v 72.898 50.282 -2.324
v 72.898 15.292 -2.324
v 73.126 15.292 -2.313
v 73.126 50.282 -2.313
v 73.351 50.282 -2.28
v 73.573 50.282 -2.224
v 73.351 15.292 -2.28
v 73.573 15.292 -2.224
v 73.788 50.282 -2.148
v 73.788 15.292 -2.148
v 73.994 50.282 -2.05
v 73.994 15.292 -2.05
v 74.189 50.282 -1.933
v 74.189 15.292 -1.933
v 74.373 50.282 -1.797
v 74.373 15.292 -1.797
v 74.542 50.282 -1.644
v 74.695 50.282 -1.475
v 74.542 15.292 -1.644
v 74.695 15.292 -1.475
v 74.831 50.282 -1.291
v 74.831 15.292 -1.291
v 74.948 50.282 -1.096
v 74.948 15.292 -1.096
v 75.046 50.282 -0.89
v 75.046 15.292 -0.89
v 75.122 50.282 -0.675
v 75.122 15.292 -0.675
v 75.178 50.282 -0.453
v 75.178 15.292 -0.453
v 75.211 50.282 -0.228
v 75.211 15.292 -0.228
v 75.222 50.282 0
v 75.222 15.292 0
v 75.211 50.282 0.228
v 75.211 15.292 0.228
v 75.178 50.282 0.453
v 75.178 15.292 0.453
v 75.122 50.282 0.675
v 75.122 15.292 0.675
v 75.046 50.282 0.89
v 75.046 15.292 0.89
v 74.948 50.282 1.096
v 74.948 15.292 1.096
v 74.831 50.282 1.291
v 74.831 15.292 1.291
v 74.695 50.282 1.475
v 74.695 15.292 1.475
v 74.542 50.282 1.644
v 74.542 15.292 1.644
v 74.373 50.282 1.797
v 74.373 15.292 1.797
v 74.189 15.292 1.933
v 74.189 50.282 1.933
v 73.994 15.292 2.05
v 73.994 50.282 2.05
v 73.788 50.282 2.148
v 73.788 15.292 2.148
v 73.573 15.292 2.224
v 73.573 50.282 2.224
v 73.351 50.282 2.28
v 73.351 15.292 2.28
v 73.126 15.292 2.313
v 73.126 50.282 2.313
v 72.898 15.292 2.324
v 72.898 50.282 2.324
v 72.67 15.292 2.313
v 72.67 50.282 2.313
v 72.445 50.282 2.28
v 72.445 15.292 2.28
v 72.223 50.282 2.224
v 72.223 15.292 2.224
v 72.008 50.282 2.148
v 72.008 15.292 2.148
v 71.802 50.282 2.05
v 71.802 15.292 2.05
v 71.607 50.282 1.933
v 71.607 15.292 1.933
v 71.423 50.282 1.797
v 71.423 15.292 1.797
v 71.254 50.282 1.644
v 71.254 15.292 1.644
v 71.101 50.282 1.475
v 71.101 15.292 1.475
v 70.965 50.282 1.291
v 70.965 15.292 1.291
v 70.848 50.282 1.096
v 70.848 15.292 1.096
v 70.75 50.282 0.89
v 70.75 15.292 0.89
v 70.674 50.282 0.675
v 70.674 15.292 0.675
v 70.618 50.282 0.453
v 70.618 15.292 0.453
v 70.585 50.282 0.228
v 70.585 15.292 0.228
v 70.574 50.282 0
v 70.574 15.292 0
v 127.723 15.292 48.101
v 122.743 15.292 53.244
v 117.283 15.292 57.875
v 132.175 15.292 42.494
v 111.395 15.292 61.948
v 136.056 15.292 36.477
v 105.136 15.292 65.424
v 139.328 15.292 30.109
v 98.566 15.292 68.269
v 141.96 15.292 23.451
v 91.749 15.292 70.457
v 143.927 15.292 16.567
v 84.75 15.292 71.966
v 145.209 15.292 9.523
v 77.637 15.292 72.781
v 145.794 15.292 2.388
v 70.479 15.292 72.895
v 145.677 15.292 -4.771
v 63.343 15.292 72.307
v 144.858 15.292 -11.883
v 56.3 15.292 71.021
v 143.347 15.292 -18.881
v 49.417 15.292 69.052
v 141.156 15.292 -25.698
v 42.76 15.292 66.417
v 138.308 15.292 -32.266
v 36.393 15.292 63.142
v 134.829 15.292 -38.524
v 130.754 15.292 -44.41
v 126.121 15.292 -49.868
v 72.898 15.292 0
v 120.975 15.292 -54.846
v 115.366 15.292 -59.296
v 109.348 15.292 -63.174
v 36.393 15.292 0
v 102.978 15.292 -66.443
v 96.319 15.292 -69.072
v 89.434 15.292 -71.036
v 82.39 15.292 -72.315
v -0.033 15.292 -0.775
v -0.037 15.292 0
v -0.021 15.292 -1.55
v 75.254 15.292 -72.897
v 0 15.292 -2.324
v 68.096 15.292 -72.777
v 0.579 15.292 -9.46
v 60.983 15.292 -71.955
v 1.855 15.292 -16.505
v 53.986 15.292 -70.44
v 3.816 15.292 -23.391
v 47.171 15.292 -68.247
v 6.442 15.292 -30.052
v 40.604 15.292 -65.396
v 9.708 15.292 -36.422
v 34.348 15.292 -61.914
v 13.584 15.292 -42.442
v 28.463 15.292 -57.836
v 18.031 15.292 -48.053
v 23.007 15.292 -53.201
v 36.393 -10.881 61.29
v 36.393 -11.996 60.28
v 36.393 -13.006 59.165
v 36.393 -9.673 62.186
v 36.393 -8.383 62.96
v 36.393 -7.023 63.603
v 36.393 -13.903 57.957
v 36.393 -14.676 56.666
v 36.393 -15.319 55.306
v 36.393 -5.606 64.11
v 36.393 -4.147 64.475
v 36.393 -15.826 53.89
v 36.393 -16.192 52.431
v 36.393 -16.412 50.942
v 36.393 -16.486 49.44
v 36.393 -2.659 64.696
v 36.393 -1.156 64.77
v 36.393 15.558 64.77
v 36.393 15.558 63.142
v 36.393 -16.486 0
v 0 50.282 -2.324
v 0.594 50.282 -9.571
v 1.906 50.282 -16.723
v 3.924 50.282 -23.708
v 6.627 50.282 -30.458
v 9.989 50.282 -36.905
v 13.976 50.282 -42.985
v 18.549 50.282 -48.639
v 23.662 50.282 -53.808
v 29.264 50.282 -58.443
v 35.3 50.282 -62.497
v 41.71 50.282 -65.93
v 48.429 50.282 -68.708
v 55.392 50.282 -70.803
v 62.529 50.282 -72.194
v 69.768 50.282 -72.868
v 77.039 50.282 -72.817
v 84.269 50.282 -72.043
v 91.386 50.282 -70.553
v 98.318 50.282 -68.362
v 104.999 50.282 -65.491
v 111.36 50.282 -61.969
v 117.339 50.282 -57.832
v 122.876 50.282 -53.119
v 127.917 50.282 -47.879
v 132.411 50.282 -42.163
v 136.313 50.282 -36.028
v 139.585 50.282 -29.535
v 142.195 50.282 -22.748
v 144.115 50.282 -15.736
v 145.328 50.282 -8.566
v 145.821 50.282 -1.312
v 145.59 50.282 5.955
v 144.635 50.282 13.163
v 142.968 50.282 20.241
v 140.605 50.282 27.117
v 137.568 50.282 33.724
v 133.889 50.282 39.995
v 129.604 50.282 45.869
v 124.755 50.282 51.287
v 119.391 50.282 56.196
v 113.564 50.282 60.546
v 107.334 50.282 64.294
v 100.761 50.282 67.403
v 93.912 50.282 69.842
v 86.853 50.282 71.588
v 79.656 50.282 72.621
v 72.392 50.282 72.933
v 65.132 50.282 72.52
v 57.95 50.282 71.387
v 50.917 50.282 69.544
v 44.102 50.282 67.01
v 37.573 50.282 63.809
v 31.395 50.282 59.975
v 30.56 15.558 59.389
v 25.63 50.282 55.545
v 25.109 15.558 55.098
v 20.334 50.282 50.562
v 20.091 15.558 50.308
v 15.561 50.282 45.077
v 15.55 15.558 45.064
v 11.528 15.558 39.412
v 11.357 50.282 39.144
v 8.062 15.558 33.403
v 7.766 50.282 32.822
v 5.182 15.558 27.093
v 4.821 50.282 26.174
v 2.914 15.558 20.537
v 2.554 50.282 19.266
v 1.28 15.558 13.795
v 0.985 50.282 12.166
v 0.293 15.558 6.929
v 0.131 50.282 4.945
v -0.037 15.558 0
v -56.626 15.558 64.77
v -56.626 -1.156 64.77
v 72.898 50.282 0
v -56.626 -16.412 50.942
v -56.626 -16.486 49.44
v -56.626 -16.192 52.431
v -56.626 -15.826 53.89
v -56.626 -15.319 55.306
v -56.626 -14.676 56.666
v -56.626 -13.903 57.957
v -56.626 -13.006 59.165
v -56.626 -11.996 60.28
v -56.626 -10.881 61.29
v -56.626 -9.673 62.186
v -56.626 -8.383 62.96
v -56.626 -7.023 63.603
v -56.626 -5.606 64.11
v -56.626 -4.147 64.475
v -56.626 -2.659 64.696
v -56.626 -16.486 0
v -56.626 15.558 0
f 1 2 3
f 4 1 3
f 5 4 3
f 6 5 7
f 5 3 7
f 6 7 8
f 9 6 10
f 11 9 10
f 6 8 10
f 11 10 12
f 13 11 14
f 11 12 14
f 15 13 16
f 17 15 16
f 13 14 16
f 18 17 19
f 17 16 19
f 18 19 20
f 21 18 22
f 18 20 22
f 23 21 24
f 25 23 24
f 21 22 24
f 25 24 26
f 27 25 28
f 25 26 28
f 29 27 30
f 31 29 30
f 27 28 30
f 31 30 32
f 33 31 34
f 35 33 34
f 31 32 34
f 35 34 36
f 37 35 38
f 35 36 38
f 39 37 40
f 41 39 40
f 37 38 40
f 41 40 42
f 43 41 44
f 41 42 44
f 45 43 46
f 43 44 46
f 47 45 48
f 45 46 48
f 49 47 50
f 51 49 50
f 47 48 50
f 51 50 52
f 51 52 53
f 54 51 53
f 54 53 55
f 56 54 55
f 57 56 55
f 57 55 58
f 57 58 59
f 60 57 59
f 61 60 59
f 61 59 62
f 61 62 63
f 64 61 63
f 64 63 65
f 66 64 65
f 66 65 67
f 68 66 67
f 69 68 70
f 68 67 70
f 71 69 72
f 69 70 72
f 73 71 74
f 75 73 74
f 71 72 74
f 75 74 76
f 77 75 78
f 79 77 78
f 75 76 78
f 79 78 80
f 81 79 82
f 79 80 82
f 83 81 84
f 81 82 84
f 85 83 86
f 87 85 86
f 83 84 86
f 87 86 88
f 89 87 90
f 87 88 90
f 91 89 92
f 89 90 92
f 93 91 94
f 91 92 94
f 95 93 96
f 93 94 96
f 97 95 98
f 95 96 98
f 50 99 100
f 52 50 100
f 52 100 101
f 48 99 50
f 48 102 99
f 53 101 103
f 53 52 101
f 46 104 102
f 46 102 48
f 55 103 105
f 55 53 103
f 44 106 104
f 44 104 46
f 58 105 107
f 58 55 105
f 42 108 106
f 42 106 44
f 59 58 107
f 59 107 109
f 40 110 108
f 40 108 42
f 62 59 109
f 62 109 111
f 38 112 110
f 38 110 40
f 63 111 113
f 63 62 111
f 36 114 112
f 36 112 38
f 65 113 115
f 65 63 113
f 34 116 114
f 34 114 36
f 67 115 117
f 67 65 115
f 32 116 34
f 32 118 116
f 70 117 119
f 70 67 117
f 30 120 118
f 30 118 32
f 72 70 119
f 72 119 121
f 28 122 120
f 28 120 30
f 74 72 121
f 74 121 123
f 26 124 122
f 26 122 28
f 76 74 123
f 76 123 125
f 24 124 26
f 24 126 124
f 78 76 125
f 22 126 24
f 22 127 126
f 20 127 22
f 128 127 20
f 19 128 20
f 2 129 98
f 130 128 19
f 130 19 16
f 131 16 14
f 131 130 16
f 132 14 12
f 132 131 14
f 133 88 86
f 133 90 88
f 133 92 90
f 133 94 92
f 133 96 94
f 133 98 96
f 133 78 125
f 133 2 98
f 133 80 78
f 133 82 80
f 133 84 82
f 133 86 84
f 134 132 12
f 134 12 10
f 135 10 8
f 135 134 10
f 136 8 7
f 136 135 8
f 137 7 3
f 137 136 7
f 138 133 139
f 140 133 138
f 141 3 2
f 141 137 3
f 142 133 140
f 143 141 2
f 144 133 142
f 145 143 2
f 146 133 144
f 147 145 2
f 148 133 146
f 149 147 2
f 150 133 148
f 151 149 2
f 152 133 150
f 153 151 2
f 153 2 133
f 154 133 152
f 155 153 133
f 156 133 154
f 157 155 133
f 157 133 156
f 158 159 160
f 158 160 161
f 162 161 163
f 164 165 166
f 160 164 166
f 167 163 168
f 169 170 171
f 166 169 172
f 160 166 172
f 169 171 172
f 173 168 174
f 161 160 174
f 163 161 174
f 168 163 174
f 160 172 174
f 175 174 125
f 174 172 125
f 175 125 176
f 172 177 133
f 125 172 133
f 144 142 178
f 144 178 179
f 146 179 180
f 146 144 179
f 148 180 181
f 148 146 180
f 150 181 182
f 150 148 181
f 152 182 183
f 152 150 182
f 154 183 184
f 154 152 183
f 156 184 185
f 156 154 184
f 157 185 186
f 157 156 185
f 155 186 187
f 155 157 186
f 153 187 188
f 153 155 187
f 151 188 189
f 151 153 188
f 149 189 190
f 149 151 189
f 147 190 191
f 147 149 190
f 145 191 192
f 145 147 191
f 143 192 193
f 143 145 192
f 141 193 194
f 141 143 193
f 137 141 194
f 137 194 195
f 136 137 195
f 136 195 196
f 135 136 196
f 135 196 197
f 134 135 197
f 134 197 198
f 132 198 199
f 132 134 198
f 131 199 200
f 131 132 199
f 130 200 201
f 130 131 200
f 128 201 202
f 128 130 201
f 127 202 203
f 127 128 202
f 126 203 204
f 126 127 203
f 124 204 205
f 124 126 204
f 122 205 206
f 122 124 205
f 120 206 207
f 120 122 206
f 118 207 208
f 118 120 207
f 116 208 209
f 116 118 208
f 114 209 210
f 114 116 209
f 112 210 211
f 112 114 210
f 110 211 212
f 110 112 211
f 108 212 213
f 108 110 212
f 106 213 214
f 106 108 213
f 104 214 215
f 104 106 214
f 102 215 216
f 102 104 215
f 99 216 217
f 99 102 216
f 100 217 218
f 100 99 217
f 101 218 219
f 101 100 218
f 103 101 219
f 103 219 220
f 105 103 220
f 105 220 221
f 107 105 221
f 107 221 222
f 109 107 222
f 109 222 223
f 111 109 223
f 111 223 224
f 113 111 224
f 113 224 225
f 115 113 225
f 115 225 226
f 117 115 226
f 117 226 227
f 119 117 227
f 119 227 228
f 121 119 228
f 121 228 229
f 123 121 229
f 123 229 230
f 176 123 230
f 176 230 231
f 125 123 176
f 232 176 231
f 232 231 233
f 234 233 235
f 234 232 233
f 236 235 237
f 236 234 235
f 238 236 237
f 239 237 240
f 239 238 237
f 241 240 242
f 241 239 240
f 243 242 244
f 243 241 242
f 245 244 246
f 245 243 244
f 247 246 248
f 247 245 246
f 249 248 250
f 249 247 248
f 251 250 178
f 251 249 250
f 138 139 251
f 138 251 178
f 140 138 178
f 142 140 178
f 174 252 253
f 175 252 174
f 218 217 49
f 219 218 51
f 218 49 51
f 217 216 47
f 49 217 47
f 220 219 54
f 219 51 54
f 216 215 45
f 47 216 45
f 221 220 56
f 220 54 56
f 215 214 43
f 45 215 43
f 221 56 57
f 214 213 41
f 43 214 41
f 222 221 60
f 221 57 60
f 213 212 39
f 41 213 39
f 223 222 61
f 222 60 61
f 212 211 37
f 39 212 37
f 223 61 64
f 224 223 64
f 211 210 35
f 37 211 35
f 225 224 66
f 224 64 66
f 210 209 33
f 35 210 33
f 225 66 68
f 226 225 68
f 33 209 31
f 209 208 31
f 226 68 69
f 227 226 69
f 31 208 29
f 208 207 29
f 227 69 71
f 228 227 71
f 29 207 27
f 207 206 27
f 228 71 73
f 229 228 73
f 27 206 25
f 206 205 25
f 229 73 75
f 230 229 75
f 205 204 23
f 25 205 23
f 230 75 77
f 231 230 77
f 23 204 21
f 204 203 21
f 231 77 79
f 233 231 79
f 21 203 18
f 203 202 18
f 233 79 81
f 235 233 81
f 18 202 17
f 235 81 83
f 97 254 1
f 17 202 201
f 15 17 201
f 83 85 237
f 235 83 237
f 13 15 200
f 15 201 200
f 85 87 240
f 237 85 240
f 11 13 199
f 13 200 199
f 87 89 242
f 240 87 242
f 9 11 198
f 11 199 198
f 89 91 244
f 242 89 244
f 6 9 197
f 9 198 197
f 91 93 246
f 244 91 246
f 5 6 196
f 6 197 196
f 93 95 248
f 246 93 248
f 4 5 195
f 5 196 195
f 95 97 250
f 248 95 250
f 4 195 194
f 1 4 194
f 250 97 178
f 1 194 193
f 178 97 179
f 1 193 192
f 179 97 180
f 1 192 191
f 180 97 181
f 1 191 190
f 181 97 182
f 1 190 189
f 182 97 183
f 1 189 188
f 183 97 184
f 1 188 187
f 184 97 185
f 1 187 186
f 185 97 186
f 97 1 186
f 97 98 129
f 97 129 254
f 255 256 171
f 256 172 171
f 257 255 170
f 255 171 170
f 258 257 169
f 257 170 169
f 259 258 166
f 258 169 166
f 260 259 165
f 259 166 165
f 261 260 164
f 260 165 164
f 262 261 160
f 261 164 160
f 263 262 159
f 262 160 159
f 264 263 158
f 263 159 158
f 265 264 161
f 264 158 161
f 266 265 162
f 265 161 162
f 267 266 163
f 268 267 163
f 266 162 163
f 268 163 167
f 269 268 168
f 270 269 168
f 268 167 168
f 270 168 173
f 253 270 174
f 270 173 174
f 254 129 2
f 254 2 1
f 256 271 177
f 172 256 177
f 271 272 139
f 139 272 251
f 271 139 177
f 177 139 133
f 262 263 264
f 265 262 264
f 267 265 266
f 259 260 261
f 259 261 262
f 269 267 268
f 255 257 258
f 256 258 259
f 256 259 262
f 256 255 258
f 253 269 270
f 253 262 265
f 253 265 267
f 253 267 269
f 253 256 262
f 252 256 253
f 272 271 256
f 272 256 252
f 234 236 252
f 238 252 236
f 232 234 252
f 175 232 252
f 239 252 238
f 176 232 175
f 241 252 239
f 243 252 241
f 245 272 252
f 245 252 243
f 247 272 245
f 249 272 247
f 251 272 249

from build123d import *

# Parameters (mm, degrees)
F0_W      = 93.019191
F0_H      = 32.043829
F1_DEPTH  = 64.77
F2_R      = 15.330256
F3_W      = 34.98908
F3_H      = 2.32445
F4_DEPTH  = 72.898
F4_FACE_W = 72.898
F4_FACE_H = 34.98908


with BuildPart() as f1:
    # F0 (on Top) → F1 (new body)
    with BuildSketch(Plane.XY):
        with Locations((-10.116236, -0.464286)):
            Rectangle(F0_W, F0_H)
    extrude(amount=F1_DEPTH)

    # F2
    f2_edges = [f1.edges().sort_by_distance(p)[0] for p in [
        (-10.116236, -16.486201, 64.77),
    ]]
    fillet(f2_edges, radius=F2_R)

    # F3 (on Right) → F4 (join)
    with BuildSketch(Plane.YZ):
        with Locations((32.786973, -1.162225)):
            Rectangle(F3_W, F3_H)
    extrude(amount=F4_DEPTH)

    # F4_face (on face) → F5 (revolve)
    with BuildSketch(Plane(origin=(36.449, 32.786973, -2.32445), x_dir=(1, 0, 0), z_dir=(0, 0, -1))):
        Rectangle(F4_FACE_W, F4_FACE_H)
    revolve(axis=Axis((72.898, 32.786973, 0), (0, -1, 0)))


solid = f1.part
